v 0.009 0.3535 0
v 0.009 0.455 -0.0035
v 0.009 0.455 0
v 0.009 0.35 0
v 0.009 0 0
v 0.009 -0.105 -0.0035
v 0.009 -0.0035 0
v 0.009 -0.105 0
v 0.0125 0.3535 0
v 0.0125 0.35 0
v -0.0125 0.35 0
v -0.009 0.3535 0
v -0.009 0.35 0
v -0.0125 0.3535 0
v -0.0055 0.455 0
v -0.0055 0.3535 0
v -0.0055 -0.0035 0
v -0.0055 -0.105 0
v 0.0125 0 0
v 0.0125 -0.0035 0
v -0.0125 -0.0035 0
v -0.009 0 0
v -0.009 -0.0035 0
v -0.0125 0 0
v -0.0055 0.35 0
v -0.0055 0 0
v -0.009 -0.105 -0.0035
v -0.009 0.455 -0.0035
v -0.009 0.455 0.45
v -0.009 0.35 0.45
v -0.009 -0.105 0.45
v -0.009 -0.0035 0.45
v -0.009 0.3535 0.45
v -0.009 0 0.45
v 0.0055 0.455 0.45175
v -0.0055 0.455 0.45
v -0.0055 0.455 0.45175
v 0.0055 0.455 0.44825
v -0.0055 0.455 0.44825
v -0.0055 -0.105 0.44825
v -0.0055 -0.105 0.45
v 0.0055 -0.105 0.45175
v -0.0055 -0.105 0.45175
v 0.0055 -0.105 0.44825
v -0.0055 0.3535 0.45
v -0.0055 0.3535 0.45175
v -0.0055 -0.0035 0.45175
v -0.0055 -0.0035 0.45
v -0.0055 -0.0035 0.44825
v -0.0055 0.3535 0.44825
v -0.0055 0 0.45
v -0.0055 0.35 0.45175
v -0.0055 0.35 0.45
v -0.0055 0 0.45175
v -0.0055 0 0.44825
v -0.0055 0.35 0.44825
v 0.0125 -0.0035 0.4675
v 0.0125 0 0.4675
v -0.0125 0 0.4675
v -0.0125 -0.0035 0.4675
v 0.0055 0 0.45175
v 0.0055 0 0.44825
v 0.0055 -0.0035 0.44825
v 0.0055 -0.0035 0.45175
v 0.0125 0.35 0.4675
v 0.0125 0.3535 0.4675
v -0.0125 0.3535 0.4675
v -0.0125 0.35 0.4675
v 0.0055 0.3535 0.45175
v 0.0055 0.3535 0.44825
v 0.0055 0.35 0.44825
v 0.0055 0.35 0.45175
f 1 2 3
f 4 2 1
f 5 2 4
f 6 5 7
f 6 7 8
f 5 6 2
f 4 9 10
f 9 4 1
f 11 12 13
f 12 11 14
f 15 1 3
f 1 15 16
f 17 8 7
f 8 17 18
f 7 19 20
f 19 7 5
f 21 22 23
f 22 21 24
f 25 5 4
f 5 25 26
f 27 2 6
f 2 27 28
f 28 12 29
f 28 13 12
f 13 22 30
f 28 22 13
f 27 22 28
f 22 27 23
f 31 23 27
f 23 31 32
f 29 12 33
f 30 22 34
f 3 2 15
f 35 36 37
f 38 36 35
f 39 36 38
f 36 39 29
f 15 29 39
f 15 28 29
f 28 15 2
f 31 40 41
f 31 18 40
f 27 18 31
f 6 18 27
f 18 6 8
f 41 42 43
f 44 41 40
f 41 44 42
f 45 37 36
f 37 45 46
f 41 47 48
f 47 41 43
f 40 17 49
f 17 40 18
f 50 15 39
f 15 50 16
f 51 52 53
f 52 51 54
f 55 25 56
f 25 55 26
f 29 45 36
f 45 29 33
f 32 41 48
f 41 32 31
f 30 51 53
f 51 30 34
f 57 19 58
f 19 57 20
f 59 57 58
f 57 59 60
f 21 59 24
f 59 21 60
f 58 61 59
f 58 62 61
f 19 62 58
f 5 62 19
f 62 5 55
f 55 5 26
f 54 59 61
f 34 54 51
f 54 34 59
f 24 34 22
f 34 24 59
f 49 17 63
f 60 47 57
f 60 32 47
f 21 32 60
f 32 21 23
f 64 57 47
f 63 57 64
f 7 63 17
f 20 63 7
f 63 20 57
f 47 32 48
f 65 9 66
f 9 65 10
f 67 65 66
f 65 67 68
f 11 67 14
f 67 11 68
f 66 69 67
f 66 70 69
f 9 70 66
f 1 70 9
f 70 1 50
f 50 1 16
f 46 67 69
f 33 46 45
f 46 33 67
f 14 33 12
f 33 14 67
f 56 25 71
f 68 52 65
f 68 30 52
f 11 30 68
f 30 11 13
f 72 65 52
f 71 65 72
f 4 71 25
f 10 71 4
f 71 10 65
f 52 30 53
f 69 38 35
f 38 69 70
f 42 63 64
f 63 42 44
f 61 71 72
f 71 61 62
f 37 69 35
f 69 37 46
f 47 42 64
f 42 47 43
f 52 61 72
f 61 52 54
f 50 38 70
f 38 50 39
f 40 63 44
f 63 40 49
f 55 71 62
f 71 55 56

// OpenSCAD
mode = 0;py1=-0;py2=0;pz=-0;

//Dimension : principal box
v=0.011;//'void widith;  x
l=0.35; //box length;  y
h=0.45; //box height;  z
e=0.01*l;
//Value needed to centralise figure in x
val=(v+2*e)/2;

//Floor
module bot() {
translate([-val,-0.3*l,-e]) 
    cube([v+2*e,l*1.6,e]);
    }
//Glass
module glass1() {
translate([-val,-0.3*l ,0]) 
    color("blue") 
    cube([e,l*1.6,h]);
    }
module glass2() {
translate([e+v-val,-0.3*l,0]) 
    color("blue") 
    cube([e,l*1.6,h]);
    }
//Pression lateral1 mov y+
module pistY1() {
translate([-e-val,-e ,0]) 
    color("red") 
    cube([v+4*e,e, h+5*e]);
    }
//Pression lateral2 mov y-
module pistY2() {
translate([-val-e,l ,0]) 
    color("red") 
    cube([v+4*e,e, h+5*e]);
    }
//Pression vertical mov z-
module pistZ() {
translate([e+v/2-val,l/2 ,h]) 
    color("red") 
    cube([v,1.6*l, e], true); 
}
 module insertHelper() {
translate([e+v/2-val,l/2 ,3*h/2]) 
difference() {

    color("red") 
    cube([v*1.4,l*1.6, h], true);
        color("red") 
        cube([v,l, 2*h], true);
    }
}
module all(){
    bot();
    glass1();
    //glass2();
    pistY1();
    pistY2();
    pistZ();
    //insertHelper(); 
}
if (mode==1){
    bot();
}else if (mode==21){
    glass1();
}else if (mode==22){
    glass2();
}else if (mode==31){
    pistY1();
}else if (mode==32){
    pistY2();
}else if (mode==4){
    pistZ();
}else if (mode==5){
    insertHelper(); 

}else{
    all();
}
